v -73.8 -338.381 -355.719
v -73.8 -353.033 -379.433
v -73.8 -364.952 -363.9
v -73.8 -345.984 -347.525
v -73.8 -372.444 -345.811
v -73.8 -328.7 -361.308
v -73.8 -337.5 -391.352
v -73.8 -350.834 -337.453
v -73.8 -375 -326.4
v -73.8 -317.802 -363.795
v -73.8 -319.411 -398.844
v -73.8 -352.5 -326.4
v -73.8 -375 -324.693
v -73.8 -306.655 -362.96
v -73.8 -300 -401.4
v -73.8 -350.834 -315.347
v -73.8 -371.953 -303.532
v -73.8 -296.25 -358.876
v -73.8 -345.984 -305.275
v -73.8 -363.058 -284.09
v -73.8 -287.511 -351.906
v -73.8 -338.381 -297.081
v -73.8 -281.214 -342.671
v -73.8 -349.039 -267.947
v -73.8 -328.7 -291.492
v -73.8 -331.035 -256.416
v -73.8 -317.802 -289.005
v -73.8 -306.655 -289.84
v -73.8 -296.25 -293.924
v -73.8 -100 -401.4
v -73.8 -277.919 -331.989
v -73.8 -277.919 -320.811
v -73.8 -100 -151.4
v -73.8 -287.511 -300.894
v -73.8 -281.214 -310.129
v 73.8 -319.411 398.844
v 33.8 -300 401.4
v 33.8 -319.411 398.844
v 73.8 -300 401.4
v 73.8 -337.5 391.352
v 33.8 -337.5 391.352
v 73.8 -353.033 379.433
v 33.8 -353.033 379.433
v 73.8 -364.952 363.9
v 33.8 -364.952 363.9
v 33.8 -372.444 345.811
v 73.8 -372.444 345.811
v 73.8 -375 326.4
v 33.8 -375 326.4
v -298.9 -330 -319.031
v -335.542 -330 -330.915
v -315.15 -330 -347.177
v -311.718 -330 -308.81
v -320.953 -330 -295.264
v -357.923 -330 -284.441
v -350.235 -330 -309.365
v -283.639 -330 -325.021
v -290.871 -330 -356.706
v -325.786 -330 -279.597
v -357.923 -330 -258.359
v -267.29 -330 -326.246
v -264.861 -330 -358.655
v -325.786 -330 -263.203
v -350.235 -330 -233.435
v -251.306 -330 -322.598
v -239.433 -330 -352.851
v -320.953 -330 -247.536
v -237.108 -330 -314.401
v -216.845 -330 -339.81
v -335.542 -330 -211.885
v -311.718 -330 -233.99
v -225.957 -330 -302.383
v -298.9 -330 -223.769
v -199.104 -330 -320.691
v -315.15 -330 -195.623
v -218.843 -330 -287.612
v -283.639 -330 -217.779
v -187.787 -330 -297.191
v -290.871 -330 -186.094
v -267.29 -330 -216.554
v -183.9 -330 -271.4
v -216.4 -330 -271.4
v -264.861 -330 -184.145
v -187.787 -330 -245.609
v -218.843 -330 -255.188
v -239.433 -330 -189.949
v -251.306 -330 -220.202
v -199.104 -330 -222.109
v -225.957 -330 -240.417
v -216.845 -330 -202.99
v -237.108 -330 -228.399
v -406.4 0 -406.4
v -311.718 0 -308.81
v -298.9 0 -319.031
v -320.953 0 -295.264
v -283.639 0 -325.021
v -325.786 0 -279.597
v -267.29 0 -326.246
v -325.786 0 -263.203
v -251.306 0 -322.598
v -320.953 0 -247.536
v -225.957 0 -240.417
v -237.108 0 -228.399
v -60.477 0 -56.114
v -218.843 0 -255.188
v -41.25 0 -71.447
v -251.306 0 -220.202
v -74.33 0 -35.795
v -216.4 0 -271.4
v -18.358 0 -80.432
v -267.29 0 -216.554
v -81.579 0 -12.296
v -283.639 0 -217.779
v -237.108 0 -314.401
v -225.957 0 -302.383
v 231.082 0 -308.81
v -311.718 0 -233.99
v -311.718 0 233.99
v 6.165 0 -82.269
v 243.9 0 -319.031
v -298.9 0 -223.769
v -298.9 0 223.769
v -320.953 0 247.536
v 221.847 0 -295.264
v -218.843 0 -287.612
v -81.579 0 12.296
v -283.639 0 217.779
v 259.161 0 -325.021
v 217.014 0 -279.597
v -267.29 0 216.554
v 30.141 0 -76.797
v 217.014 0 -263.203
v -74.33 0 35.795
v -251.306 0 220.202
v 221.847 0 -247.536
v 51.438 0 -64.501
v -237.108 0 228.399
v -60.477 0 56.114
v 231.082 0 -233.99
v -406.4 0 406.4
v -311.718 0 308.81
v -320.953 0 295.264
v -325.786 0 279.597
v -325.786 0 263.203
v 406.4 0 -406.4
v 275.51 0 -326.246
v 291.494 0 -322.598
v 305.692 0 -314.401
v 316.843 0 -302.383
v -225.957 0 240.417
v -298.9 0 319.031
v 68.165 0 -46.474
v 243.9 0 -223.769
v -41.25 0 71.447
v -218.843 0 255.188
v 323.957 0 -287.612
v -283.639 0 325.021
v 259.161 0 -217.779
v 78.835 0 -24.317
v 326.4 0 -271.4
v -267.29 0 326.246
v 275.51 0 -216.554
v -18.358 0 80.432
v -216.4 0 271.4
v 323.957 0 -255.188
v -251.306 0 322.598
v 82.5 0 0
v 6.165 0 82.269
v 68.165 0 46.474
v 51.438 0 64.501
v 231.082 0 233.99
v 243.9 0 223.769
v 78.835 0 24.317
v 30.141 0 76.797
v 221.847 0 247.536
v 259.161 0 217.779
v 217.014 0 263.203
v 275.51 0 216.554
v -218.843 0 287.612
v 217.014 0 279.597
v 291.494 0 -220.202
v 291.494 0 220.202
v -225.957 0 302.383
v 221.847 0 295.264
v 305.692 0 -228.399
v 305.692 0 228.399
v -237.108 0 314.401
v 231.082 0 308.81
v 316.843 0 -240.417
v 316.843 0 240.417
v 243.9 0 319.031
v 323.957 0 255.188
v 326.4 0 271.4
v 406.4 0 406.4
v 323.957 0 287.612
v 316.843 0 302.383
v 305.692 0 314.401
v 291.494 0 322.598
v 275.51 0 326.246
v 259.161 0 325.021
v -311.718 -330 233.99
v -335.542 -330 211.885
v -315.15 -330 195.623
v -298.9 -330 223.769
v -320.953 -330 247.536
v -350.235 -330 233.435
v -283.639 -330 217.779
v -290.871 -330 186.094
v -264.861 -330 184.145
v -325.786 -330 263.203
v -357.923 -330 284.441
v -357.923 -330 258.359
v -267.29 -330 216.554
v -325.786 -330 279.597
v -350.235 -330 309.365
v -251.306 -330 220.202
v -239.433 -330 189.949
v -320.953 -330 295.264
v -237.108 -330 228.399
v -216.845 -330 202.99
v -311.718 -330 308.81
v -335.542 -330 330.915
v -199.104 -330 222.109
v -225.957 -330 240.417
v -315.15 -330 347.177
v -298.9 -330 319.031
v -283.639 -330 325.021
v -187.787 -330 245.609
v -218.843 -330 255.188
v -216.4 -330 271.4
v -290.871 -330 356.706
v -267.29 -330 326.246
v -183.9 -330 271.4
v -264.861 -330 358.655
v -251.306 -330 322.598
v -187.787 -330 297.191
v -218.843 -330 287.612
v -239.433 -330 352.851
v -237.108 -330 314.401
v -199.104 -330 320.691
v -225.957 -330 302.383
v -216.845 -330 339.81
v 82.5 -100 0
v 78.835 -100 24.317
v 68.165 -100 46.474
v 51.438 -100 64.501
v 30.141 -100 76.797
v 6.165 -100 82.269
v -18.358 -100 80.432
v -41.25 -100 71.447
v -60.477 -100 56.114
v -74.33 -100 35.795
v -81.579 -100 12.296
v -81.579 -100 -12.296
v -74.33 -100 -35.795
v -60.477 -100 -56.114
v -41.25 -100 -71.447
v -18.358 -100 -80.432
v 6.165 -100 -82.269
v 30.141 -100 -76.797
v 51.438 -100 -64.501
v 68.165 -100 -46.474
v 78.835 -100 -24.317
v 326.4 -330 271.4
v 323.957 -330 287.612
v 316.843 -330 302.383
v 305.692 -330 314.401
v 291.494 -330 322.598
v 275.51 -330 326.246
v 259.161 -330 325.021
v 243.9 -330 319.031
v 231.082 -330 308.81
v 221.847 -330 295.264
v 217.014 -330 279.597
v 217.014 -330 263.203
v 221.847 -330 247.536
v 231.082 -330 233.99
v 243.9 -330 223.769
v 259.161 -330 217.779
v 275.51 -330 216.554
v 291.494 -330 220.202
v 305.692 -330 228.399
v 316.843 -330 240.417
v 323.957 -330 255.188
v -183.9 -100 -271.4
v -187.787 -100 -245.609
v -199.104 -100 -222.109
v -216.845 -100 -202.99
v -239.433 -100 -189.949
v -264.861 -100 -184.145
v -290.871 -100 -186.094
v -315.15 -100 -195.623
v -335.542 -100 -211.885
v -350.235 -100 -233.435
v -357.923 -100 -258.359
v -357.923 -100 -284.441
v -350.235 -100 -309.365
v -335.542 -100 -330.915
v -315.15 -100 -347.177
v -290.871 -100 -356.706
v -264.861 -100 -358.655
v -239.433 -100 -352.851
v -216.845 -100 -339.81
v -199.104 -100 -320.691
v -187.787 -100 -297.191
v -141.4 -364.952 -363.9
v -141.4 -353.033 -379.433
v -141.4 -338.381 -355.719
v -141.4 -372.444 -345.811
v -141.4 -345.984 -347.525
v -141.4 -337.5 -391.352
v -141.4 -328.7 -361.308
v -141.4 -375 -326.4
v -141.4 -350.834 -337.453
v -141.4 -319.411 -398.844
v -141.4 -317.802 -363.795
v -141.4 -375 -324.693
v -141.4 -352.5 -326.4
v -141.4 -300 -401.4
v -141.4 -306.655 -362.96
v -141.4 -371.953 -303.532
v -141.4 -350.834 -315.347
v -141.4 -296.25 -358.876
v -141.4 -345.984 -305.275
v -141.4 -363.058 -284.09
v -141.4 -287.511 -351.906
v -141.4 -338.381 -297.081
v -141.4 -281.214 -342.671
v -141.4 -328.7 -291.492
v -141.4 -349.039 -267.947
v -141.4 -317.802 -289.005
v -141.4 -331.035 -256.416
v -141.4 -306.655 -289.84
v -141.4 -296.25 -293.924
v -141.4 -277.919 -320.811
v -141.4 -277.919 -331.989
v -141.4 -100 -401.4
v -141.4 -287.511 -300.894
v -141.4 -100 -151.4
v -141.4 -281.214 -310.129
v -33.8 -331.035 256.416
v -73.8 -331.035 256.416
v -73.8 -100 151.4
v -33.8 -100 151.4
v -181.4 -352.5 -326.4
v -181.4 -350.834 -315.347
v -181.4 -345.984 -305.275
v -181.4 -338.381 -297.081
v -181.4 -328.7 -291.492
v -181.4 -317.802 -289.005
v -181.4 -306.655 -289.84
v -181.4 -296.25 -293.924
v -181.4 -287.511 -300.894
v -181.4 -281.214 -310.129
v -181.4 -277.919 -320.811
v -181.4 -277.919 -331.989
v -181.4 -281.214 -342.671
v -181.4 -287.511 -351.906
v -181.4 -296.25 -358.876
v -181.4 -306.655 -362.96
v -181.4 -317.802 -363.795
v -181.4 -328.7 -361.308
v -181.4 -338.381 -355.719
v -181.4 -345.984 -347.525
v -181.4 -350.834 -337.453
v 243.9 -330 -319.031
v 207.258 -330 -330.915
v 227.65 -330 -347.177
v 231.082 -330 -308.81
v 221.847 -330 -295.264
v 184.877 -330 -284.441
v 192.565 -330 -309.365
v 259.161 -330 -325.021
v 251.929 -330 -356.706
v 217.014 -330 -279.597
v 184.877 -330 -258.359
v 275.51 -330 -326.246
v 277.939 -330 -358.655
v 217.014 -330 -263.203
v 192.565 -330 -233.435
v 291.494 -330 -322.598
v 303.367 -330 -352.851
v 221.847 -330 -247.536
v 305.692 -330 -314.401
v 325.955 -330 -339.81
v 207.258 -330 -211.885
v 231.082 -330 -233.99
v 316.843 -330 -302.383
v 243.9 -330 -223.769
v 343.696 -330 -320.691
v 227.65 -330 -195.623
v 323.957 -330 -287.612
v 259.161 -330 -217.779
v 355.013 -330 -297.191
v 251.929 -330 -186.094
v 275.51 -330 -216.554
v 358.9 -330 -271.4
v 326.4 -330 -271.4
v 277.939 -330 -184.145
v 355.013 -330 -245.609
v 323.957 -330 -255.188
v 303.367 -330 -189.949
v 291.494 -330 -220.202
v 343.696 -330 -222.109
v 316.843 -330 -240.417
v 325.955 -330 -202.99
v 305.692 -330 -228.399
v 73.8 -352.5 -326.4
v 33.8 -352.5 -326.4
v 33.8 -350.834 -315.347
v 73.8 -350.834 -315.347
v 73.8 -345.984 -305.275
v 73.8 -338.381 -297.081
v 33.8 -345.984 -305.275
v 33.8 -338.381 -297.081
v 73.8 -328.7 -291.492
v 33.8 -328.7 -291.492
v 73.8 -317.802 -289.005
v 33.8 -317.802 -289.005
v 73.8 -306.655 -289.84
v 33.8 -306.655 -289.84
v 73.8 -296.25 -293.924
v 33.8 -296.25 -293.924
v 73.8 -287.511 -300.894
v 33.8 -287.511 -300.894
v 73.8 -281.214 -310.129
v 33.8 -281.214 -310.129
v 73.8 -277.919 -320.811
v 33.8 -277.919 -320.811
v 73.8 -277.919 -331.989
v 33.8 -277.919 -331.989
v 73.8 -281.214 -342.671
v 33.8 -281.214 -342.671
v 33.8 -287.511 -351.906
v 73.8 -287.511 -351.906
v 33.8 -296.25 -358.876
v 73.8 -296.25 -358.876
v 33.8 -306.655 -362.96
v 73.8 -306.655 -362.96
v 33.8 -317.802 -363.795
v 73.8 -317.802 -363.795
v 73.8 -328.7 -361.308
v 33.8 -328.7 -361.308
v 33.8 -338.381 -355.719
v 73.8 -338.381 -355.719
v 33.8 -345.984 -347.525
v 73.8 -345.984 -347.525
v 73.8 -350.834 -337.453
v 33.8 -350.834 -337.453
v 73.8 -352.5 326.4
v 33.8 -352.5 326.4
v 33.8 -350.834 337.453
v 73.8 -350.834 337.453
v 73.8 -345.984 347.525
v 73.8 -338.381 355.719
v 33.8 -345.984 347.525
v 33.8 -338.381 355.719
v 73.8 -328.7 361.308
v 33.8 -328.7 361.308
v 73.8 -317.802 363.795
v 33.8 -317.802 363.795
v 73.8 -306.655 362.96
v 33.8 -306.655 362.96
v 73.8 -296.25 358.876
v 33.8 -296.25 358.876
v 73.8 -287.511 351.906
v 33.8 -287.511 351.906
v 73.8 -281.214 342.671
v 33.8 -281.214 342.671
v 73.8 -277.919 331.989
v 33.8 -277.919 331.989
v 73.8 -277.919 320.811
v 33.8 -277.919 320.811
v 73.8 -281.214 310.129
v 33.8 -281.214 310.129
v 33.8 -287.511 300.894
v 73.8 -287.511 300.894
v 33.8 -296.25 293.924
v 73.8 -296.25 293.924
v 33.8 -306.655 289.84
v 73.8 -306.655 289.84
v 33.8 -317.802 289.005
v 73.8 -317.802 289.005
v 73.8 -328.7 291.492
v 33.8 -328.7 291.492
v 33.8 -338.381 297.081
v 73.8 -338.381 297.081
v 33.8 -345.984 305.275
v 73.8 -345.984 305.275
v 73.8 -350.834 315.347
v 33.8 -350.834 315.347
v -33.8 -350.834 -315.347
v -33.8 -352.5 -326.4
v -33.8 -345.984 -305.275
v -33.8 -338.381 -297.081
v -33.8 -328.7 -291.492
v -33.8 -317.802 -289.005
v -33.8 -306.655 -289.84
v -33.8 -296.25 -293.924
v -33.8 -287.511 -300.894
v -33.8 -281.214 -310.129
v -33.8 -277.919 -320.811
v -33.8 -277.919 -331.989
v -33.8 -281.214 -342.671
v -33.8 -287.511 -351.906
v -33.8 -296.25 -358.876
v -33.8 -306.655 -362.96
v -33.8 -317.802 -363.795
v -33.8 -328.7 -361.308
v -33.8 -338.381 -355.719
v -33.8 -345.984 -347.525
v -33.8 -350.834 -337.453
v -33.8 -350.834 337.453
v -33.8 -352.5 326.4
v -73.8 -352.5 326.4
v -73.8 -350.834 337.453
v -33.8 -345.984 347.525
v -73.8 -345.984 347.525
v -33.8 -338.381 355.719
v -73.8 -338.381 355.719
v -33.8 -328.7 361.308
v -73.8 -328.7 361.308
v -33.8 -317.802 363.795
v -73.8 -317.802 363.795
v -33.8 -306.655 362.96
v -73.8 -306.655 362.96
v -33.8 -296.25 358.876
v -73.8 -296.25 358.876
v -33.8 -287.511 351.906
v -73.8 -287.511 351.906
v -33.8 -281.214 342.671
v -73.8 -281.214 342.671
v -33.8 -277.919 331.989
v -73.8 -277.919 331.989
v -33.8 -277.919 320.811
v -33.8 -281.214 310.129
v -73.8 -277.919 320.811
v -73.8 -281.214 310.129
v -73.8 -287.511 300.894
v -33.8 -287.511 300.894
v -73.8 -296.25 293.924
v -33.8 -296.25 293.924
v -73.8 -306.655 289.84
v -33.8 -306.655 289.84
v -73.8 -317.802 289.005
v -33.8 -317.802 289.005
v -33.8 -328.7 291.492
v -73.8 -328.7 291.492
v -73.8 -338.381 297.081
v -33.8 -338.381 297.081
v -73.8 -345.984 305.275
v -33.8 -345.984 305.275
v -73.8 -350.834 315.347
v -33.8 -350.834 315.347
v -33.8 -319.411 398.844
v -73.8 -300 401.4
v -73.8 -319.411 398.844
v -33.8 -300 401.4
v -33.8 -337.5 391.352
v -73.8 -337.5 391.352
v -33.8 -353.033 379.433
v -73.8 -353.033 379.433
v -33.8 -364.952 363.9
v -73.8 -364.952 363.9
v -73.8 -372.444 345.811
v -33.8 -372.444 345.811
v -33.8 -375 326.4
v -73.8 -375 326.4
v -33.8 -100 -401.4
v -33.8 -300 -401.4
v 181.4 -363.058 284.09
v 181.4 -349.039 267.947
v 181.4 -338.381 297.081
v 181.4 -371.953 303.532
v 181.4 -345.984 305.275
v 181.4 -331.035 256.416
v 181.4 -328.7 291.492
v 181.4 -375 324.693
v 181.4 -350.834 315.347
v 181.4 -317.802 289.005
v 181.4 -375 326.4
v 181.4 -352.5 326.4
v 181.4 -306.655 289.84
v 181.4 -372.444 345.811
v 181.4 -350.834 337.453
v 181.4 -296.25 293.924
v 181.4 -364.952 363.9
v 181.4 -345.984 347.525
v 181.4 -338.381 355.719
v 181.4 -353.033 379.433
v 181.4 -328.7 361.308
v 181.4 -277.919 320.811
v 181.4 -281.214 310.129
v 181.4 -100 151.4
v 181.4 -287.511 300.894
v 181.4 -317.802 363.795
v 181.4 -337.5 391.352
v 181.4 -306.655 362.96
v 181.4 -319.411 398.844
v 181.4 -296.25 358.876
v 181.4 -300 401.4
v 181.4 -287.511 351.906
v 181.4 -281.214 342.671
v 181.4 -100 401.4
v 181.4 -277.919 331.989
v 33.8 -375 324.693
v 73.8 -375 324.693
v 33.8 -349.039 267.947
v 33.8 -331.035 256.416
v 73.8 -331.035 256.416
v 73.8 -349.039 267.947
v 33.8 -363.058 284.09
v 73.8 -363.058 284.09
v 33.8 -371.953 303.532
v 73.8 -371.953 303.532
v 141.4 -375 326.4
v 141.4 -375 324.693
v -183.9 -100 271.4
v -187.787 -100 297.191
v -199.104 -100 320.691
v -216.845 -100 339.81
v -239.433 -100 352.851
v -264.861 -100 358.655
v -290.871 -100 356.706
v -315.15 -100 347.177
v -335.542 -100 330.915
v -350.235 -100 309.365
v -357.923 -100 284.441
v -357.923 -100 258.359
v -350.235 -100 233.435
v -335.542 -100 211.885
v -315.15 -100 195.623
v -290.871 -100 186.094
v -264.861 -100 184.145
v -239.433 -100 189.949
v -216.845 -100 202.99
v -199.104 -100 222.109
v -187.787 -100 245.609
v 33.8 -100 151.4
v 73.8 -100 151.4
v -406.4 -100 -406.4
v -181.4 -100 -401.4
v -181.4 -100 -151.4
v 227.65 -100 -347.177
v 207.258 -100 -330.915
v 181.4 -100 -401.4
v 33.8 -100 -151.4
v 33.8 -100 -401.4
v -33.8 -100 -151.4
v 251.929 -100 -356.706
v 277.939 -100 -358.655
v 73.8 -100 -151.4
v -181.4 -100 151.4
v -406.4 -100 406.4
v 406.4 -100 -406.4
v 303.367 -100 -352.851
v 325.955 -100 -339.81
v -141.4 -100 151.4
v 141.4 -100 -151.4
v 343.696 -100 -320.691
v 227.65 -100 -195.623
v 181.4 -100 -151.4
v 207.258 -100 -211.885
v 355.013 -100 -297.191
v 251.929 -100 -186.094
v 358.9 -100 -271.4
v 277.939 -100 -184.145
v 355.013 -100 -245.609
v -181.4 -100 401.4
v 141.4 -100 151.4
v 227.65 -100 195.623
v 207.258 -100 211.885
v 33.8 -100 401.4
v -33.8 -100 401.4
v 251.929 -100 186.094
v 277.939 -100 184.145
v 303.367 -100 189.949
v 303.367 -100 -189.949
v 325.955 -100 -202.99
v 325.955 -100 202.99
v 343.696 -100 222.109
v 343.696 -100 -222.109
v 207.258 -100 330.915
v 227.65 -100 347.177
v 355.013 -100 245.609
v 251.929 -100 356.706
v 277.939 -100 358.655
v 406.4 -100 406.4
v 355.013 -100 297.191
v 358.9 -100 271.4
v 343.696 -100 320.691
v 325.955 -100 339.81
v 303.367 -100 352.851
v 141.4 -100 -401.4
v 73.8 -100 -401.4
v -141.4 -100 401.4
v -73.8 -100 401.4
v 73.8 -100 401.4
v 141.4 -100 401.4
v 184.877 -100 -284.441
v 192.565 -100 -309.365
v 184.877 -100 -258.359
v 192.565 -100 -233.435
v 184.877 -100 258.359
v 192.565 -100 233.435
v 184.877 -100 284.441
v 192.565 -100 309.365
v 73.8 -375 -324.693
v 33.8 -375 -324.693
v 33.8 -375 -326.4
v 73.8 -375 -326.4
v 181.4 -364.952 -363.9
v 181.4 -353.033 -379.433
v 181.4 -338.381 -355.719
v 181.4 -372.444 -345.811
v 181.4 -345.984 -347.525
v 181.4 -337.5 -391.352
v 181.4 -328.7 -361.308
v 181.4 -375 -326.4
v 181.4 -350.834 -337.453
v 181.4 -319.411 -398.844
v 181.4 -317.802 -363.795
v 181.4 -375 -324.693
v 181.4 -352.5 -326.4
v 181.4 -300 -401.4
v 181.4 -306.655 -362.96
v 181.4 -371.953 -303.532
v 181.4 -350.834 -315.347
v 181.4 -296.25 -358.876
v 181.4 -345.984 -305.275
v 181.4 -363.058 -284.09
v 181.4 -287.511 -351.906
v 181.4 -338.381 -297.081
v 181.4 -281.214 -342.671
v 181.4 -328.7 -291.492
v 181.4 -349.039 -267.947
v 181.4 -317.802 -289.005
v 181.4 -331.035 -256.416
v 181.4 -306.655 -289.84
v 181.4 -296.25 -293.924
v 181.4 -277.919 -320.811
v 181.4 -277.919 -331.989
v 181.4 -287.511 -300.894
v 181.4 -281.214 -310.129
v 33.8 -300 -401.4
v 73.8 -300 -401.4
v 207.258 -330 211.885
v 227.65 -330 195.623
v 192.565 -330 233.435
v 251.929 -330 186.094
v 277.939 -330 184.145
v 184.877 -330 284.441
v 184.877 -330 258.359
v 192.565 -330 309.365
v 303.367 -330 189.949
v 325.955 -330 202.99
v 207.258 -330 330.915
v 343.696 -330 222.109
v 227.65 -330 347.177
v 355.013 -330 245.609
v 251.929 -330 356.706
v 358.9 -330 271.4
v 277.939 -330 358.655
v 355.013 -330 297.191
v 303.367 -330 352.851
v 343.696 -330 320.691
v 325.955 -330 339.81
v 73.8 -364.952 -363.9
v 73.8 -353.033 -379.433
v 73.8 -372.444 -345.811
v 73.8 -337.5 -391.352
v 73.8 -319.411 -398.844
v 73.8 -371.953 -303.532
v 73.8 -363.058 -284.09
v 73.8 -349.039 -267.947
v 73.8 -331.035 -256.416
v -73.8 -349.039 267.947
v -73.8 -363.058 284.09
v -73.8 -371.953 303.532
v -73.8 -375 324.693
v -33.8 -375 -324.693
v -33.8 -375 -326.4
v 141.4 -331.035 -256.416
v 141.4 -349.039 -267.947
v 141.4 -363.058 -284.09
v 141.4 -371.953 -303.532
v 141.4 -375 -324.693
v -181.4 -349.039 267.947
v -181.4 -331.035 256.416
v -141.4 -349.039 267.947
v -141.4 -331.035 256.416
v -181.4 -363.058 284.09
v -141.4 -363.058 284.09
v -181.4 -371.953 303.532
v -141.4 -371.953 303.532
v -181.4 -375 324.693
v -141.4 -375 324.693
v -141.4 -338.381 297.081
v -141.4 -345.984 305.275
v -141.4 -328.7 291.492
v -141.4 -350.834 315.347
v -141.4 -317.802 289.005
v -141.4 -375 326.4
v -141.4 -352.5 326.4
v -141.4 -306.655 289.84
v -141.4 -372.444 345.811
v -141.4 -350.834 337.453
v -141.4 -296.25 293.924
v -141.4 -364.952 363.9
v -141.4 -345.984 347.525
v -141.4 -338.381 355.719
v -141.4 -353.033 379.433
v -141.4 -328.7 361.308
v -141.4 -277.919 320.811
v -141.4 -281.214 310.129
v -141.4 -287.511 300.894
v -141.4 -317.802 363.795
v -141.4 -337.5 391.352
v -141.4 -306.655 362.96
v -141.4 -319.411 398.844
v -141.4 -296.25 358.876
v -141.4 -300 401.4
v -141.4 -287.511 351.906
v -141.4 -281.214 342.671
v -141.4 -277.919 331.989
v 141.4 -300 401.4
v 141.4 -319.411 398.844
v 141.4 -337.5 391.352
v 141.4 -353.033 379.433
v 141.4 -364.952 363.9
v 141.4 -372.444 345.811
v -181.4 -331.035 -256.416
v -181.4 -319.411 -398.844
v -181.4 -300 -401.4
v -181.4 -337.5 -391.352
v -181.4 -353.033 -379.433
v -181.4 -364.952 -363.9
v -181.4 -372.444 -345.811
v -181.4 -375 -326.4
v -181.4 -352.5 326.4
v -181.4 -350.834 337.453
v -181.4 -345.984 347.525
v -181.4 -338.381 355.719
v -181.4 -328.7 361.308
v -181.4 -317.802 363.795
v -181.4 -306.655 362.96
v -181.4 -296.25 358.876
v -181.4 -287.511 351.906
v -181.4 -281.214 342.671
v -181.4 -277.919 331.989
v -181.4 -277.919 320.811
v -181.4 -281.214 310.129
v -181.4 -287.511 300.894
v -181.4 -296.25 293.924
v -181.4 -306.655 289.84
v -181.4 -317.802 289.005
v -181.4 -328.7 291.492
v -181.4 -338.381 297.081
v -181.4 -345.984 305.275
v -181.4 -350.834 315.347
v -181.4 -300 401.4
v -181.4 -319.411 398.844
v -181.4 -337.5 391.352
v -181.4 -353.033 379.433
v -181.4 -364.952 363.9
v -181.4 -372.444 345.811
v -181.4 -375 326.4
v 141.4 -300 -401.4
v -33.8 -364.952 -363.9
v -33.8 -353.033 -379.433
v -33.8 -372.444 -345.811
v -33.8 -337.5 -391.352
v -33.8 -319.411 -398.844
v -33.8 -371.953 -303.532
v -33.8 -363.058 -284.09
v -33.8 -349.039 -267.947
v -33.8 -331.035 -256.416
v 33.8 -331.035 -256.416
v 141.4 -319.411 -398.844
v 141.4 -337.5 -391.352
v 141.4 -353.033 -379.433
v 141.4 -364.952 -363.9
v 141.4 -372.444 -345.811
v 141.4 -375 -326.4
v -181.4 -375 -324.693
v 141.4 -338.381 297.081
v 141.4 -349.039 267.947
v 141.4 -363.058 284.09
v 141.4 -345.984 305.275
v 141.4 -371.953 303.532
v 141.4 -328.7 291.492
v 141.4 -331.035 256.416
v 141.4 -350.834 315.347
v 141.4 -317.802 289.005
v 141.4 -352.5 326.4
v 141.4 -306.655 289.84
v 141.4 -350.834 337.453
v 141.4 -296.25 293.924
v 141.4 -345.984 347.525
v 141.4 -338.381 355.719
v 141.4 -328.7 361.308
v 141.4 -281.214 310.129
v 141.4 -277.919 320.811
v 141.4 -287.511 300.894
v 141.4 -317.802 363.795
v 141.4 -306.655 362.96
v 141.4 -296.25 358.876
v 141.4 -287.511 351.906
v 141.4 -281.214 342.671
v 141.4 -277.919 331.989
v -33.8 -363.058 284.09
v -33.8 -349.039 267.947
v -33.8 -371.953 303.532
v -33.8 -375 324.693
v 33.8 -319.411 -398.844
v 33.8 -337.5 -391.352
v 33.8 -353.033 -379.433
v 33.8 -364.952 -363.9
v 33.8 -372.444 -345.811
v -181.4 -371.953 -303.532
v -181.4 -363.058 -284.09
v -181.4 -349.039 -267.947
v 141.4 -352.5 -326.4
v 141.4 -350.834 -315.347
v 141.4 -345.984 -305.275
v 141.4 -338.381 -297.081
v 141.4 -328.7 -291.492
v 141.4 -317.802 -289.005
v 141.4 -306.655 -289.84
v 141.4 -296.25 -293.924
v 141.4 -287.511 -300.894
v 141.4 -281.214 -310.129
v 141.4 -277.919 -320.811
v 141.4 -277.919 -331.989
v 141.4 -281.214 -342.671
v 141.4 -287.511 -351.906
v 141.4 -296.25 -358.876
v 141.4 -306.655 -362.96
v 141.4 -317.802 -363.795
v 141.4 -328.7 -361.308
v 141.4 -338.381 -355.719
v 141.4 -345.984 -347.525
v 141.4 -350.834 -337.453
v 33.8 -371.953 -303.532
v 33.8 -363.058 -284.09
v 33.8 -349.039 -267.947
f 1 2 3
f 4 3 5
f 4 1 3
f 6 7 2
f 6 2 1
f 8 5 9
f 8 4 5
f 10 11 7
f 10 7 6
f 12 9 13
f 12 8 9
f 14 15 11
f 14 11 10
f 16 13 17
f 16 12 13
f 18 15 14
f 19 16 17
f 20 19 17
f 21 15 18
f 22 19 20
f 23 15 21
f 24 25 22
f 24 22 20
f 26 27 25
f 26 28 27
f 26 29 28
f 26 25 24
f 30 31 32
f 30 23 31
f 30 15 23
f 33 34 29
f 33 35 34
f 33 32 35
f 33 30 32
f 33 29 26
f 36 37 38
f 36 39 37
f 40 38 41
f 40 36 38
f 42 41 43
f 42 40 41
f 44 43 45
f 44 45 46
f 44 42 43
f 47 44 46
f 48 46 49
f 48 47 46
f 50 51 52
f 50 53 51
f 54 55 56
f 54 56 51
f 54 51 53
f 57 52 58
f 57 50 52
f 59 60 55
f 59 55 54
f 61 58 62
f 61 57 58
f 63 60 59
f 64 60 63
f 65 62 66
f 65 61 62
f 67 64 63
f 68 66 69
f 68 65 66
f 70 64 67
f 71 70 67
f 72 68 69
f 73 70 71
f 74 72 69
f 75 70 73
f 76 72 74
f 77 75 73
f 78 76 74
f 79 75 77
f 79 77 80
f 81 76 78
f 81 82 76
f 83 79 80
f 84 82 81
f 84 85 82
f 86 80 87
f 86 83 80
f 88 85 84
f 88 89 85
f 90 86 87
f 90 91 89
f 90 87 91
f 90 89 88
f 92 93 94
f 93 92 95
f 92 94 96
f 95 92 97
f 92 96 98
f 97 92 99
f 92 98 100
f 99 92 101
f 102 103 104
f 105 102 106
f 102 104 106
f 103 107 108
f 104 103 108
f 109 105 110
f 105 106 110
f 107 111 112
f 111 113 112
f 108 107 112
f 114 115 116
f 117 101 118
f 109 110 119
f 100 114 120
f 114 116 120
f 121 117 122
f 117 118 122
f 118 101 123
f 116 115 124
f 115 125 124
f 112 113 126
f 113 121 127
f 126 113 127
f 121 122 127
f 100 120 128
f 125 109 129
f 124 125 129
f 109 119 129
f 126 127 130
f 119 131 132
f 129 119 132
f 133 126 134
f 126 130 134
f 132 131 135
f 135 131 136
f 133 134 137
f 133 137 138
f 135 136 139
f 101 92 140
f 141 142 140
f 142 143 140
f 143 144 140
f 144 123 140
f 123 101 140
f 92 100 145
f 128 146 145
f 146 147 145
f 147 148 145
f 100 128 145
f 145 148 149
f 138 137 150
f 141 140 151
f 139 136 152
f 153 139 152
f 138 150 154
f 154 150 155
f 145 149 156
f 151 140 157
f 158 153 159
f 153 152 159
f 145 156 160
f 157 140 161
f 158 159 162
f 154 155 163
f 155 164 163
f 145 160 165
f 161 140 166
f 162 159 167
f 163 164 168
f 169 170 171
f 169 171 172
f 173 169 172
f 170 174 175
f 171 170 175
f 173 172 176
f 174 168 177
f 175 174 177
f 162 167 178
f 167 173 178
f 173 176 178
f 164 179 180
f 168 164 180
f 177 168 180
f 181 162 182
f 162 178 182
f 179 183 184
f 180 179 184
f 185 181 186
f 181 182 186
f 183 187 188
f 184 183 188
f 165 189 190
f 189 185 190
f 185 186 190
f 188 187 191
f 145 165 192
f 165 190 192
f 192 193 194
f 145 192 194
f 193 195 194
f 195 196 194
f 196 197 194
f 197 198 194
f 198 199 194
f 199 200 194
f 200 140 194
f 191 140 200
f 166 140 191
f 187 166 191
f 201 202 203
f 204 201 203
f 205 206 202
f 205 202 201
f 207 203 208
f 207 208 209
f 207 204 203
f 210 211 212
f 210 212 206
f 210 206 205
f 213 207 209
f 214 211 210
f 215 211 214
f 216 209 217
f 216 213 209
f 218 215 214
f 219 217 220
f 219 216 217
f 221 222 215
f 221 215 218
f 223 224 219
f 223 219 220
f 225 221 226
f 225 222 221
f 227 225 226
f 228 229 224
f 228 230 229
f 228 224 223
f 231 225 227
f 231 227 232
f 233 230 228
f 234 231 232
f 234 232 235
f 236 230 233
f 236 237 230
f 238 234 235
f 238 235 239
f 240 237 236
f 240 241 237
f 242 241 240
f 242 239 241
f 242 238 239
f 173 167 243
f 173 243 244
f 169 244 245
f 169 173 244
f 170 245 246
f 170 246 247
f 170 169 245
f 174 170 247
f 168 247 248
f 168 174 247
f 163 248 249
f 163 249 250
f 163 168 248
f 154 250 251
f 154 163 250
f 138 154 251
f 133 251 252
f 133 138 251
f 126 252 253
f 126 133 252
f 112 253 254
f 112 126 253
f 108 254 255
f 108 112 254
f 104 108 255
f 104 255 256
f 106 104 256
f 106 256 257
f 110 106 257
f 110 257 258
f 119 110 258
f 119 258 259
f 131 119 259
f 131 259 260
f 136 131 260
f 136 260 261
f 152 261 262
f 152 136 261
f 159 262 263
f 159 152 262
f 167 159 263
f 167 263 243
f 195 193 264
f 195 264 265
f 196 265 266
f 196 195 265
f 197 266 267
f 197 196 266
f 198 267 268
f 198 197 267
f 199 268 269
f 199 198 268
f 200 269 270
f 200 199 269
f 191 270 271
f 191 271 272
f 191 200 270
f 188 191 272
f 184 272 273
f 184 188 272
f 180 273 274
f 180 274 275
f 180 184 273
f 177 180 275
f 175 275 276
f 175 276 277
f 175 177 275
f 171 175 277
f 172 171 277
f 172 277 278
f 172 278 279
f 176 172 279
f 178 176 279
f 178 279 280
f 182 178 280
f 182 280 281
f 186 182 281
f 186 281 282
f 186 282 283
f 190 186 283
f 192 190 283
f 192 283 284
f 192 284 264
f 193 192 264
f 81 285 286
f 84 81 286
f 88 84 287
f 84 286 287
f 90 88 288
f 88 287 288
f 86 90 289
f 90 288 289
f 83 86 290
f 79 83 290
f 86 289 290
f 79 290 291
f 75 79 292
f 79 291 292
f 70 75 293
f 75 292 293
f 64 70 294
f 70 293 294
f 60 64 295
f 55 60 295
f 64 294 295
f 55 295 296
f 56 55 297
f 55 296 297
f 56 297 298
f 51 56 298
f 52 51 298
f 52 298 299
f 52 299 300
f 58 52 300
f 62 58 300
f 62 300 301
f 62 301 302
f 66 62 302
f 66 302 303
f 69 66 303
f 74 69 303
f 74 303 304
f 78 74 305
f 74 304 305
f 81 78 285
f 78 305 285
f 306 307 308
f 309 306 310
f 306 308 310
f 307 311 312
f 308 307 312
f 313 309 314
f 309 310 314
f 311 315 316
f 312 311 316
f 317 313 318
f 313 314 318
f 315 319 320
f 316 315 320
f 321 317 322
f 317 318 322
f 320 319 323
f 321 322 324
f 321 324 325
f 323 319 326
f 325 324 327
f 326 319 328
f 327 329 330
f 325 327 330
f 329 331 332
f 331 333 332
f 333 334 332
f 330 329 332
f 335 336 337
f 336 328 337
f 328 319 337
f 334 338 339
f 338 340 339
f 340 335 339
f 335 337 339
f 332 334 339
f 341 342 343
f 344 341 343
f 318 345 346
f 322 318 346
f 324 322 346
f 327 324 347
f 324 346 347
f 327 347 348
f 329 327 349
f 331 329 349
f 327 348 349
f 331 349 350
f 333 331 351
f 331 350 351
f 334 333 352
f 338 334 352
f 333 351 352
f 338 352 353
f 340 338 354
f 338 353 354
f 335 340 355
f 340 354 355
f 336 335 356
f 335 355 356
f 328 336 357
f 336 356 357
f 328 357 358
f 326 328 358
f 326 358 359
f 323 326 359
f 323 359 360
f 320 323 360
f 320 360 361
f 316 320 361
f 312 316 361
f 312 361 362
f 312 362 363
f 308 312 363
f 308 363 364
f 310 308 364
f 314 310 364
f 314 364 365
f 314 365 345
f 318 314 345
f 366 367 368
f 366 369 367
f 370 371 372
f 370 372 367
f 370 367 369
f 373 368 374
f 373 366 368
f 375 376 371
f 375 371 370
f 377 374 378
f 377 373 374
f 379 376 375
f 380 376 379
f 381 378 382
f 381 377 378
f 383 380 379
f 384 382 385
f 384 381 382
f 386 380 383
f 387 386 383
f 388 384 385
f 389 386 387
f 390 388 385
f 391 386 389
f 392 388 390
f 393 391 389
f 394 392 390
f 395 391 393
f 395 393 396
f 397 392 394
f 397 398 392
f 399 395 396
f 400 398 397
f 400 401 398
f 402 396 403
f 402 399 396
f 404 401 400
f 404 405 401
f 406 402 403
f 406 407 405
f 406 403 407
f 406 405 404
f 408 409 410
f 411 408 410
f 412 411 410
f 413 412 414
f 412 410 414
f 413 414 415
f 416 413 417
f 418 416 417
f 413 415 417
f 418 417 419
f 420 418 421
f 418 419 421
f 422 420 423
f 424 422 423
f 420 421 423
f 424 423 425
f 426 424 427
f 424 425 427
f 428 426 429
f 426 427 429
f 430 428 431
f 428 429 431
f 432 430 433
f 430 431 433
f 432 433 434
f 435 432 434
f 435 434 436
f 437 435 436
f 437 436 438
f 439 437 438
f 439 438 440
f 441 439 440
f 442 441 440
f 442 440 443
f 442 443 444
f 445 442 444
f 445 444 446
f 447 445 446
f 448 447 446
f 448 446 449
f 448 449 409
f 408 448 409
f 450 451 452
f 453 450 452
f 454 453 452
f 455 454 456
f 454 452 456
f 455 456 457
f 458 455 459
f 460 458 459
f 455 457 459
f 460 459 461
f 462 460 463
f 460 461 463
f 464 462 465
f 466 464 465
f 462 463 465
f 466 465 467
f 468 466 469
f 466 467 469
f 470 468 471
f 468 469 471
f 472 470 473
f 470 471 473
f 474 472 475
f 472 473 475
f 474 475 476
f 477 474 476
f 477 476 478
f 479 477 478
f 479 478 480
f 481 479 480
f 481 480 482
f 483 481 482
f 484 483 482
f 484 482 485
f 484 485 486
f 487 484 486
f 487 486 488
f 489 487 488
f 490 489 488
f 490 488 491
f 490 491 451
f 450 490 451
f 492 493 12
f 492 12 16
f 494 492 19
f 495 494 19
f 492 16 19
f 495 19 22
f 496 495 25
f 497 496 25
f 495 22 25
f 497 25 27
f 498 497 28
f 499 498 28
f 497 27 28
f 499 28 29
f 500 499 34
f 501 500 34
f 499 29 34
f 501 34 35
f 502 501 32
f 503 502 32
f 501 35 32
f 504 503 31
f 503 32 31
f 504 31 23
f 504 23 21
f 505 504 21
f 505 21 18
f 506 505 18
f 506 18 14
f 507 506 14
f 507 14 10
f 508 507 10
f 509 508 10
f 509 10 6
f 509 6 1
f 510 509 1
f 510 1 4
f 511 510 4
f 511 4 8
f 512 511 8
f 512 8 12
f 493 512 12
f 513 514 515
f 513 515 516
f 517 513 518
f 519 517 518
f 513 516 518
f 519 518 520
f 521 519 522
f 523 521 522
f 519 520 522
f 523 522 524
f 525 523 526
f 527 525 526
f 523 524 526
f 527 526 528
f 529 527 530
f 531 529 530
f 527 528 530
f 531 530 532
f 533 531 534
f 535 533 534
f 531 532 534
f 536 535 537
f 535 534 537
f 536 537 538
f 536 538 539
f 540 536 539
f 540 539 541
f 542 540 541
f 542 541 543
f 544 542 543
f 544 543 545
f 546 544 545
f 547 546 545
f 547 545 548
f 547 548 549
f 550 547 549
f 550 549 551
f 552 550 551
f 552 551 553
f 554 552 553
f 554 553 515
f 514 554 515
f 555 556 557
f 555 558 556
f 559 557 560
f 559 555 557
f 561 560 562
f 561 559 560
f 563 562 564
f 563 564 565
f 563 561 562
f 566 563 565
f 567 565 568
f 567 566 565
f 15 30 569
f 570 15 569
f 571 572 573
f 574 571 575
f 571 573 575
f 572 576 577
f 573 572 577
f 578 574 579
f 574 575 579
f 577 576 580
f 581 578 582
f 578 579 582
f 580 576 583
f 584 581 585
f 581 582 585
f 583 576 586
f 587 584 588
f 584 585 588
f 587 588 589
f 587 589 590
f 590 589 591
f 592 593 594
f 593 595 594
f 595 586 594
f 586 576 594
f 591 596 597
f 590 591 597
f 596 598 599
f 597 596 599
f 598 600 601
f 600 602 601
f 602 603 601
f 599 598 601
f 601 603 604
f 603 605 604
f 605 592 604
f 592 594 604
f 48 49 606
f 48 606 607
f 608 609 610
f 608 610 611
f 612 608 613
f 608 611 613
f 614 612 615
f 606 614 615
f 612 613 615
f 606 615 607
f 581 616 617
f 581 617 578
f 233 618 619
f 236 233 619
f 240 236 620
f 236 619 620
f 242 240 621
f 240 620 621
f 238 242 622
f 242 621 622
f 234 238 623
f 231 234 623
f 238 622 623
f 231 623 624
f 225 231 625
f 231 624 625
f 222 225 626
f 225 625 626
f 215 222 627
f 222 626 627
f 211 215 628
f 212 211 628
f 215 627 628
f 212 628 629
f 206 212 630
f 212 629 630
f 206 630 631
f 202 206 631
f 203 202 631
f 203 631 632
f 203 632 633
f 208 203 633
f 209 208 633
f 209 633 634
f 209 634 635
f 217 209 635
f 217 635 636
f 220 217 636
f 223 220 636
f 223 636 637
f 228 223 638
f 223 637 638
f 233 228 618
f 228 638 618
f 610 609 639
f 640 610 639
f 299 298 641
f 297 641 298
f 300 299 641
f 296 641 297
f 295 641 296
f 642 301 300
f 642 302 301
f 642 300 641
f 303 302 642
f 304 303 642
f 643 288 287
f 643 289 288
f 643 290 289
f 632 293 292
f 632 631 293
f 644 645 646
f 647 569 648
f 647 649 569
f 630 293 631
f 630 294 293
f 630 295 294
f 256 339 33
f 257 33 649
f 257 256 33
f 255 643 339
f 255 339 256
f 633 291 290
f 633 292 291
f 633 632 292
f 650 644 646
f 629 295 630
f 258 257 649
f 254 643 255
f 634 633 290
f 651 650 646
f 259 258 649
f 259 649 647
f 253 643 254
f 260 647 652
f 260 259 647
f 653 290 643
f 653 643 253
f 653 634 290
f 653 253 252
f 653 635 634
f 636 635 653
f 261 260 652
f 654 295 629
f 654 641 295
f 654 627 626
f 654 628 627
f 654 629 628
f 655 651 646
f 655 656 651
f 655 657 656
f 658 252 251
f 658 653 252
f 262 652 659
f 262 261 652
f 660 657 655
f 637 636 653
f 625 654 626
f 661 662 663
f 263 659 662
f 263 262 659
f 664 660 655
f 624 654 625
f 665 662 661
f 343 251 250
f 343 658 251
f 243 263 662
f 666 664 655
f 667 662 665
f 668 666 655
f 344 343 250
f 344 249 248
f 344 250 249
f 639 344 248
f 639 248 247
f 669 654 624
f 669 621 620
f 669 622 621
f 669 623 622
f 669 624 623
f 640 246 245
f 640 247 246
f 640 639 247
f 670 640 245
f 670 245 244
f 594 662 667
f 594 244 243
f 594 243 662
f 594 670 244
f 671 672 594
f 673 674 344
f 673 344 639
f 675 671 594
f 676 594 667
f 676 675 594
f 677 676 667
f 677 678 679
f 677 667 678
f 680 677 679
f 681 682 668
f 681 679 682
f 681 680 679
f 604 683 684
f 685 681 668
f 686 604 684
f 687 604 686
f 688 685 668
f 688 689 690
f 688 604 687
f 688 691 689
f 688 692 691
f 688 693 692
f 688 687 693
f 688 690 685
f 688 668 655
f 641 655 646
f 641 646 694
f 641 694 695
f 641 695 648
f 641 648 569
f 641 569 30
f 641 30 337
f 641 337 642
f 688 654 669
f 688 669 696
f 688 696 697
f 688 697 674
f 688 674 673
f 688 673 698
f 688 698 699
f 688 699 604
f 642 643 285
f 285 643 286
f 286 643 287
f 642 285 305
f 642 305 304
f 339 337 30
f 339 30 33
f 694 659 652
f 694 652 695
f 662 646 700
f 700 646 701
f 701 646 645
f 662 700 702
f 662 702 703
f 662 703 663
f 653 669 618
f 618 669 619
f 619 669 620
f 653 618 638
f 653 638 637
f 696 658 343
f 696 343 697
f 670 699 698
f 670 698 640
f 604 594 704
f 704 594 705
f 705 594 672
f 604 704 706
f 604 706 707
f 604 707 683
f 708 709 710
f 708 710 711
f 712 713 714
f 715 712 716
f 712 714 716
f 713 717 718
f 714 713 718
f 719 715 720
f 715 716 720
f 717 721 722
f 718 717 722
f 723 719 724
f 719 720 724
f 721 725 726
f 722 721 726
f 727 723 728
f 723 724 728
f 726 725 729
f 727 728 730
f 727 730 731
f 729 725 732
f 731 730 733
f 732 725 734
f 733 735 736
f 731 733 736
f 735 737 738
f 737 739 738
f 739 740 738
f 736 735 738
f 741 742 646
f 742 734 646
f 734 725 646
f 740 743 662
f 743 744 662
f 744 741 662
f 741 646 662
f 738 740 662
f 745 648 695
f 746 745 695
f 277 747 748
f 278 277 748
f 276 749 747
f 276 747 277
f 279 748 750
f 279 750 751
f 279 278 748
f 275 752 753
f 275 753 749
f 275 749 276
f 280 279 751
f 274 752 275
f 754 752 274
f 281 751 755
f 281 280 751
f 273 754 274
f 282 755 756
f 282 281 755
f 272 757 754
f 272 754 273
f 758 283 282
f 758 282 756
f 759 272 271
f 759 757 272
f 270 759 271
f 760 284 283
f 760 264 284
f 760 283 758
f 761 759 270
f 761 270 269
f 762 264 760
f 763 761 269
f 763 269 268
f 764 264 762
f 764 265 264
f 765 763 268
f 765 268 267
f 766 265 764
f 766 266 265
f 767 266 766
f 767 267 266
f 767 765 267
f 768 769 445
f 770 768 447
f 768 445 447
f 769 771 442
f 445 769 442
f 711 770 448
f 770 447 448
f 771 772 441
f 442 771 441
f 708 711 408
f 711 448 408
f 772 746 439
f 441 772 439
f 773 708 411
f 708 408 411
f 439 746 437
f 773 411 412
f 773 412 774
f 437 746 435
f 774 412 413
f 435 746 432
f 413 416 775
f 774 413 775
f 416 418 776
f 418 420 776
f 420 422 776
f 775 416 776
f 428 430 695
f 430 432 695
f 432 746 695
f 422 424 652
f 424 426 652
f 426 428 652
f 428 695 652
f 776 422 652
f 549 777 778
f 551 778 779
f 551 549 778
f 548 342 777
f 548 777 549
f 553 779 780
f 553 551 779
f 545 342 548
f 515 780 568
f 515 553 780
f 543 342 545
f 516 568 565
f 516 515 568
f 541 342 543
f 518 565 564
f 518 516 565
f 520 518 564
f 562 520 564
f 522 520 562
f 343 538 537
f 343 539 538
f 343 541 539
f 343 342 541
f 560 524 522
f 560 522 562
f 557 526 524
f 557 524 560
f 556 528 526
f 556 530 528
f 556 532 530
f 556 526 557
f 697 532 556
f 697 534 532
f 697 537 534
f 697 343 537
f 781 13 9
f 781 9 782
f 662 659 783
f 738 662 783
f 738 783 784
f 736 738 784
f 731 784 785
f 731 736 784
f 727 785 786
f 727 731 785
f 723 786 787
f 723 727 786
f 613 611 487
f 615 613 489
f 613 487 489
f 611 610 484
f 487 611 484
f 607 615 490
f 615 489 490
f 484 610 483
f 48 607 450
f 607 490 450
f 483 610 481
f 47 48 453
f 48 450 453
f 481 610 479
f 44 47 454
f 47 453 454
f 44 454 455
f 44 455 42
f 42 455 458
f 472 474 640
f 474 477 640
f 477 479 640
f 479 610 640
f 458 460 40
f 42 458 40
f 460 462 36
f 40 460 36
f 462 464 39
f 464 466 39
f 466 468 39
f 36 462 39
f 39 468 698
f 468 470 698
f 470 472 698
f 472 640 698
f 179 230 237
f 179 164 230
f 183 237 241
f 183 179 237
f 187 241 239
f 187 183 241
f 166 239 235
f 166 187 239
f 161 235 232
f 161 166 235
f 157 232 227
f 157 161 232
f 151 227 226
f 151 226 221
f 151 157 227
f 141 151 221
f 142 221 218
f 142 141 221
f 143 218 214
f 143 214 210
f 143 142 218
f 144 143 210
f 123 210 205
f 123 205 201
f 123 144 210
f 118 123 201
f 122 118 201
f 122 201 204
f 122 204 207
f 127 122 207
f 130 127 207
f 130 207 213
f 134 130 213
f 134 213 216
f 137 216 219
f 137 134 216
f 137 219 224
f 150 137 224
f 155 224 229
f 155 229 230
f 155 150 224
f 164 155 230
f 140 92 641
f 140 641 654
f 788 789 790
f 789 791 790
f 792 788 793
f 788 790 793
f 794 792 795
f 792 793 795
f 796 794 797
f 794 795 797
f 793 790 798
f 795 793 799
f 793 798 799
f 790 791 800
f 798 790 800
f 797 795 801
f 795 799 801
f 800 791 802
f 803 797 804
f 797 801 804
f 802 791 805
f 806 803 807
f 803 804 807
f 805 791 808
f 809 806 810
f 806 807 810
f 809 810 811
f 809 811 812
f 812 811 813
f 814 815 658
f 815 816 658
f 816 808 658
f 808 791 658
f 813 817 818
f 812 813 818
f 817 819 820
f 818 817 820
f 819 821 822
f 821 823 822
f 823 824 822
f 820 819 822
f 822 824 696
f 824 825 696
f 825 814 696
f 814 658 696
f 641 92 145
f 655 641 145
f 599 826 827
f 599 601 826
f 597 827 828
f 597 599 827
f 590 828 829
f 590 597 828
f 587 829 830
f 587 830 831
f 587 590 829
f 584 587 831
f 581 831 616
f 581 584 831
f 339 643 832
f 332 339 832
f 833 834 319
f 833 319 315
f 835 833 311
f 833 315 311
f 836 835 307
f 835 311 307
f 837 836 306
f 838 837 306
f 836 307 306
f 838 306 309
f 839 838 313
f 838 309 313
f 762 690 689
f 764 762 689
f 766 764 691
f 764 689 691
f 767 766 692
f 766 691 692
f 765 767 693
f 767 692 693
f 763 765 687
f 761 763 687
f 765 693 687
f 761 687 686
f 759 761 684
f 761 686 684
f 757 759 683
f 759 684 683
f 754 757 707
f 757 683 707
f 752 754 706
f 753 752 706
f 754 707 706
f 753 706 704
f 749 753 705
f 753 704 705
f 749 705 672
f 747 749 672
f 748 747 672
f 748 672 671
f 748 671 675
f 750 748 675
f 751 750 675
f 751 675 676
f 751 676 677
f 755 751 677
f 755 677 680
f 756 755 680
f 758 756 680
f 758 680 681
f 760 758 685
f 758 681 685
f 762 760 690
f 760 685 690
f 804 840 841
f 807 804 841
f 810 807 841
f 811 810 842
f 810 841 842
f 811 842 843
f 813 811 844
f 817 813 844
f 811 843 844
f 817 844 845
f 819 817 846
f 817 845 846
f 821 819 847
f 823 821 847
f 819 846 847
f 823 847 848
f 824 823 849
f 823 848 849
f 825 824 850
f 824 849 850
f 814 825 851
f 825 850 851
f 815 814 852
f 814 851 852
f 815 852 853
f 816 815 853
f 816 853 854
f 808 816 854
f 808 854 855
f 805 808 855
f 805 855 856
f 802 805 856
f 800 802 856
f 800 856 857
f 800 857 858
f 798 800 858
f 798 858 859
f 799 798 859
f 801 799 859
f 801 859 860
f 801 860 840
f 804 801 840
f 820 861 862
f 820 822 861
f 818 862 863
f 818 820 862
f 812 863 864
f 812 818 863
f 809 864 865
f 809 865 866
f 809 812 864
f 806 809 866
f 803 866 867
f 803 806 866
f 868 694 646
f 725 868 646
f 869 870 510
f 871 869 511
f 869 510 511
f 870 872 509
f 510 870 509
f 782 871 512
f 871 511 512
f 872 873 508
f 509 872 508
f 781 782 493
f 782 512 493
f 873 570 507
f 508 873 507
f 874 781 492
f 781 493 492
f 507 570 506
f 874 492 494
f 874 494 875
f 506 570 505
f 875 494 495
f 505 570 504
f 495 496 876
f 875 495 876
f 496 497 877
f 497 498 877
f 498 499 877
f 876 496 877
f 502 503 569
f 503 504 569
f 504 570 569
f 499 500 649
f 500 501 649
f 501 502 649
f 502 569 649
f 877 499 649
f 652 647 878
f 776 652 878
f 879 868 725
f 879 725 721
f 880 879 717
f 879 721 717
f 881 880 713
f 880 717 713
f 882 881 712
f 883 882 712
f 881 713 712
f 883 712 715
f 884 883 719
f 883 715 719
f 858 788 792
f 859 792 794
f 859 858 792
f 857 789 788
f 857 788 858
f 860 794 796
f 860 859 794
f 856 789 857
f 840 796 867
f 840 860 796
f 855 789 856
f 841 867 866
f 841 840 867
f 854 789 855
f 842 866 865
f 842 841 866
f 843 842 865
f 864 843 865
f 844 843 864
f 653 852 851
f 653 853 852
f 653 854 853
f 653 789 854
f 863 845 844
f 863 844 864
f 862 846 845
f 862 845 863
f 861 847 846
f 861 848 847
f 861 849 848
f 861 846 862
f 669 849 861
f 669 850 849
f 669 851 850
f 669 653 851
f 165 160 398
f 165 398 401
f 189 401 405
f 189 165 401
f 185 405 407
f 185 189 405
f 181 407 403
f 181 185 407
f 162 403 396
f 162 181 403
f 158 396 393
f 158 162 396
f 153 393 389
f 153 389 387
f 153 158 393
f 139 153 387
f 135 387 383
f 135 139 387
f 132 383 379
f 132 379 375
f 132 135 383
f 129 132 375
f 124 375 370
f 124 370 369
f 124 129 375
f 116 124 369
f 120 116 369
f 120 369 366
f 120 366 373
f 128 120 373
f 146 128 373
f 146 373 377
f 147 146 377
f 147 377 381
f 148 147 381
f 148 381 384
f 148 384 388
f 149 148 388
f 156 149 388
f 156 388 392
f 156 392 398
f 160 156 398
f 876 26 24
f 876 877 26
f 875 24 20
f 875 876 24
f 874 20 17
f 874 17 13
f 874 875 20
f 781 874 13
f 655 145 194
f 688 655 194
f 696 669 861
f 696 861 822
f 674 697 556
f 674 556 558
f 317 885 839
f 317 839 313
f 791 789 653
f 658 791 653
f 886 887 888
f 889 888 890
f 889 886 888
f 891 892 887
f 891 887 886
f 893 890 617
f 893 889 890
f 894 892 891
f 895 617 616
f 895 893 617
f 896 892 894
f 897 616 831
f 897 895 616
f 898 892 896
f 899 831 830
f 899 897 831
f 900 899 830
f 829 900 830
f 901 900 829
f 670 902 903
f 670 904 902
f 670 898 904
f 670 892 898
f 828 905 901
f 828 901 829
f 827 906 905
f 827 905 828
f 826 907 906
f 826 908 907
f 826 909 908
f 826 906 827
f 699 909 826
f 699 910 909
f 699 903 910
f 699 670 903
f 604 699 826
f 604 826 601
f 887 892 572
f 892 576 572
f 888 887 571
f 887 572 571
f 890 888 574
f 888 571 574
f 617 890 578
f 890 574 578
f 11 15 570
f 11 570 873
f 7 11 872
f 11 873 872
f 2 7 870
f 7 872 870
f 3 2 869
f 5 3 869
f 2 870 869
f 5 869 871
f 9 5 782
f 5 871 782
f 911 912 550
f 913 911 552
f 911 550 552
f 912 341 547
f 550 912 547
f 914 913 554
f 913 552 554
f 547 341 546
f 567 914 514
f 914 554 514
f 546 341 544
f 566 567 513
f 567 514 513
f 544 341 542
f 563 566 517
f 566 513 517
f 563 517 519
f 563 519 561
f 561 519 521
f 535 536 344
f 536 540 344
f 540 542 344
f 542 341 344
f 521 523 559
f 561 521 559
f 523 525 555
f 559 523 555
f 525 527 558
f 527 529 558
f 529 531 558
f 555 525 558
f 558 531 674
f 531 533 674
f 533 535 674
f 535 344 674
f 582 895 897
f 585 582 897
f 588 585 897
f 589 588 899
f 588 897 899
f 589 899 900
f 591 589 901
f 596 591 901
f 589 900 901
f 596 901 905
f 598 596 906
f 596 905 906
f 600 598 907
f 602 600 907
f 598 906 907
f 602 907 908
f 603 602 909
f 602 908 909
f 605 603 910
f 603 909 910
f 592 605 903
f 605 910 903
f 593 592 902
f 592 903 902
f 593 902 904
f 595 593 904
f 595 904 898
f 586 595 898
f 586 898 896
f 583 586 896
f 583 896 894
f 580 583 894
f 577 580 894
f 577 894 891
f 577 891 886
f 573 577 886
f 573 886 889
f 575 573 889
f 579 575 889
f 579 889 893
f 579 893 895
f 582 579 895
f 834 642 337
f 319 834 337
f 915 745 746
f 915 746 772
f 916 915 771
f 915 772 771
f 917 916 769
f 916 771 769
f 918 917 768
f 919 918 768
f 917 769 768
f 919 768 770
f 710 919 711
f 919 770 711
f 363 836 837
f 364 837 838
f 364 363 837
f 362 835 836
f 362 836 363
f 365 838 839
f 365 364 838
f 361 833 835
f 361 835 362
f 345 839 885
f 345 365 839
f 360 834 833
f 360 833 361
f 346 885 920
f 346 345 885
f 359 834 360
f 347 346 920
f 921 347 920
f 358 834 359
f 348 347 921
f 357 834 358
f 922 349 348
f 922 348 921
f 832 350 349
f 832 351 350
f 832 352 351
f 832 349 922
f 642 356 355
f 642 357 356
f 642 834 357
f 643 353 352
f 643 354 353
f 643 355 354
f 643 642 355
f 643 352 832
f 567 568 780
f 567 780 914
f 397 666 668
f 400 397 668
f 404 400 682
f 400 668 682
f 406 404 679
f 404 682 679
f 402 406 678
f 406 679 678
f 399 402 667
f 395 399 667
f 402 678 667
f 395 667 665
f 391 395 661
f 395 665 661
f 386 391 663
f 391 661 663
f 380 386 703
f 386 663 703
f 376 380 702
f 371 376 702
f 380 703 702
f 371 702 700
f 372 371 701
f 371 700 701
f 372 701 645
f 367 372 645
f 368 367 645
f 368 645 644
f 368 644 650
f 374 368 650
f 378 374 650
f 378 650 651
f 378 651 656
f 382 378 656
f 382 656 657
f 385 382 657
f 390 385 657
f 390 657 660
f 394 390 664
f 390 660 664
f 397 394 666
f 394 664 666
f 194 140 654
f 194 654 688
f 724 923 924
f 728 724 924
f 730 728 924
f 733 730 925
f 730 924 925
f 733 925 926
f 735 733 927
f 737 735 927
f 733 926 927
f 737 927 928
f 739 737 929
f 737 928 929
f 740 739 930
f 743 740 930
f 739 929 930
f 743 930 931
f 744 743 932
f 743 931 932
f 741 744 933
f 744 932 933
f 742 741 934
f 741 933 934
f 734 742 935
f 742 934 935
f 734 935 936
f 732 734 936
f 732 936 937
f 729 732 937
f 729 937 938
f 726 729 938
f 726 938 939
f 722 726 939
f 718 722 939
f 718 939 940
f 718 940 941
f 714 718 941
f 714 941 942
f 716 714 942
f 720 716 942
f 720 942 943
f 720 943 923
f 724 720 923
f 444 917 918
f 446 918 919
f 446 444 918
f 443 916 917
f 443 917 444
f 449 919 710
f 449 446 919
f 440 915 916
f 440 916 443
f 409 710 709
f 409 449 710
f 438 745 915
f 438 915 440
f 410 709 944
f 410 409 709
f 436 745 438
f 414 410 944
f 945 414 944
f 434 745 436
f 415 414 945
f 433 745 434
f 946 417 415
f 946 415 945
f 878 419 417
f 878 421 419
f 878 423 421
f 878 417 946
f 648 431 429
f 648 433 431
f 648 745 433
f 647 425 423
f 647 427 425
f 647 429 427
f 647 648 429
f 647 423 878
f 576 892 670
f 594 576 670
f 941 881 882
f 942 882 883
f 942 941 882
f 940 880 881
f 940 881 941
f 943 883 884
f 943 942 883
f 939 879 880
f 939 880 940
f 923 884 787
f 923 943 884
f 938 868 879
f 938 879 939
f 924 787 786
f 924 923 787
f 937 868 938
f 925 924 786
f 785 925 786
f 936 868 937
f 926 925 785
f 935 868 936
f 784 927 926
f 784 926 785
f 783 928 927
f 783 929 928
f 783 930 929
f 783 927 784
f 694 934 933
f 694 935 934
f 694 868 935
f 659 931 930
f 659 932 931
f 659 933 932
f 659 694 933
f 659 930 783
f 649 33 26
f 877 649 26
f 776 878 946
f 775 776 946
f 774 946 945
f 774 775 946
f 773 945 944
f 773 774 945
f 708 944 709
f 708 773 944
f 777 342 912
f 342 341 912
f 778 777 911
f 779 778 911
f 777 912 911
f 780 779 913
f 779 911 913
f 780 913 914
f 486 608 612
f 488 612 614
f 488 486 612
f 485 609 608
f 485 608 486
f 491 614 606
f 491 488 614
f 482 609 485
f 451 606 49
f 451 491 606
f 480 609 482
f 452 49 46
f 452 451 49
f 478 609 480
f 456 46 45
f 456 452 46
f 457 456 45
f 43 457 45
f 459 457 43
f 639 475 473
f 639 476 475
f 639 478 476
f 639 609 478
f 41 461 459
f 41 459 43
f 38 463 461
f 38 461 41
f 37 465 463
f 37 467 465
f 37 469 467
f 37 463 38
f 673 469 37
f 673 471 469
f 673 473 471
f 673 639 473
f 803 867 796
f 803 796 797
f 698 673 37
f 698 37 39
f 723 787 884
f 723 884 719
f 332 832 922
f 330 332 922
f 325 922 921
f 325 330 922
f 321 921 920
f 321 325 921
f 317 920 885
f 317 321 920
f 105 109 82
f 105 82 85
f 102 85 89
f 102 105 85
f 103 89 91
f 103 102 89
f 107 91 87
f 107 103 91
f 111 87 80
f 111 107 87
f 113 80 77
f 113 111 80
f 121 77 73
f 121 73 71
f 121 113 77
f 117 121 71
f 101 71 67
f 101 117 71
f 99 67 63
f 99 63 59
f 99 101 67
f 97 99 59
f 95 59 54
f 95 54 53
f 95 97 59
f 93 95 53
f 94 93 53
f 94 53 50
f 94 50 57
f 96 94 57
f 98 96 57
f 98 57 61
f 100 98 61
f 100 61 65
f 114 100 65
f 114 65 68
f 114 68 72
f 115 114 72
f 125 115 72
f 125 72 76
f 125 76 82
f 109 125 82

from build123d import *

# Parameters (mm, degrees)
F0_W      = 812.8
F0_H      = 812.8
F0_R      = 55
F0_R_2    = 82.5
F1_DEPTH  = 100
F2_R      = 87.5
F2_R_2    = 55
F3_DEPTH  = 230
F4_W      = 40
F4_H      = 250
F5_DEPTH  = 275
F7_DEPTH  = 362.8
F8_R      = 75
F9_R      = 37.5
F10_DEPTH = 362.8


with BuildPart() as f1:
    # F0 (on Front) → F1 (new body)
    with BuildSketch(Plane.XZ):
        Rectangle(F0_W, F0_H)
        with Locations((-271.4, -271.4)):
            Circle(F0_R, mode=Mode.SUBTRACT)
        Circle(F0_R_2, mode=Mode.SUBTRACT)
        with Locations((271.4, -271.4)):
            Circle(F0_R, mode=Mode.SUBTRACT)
        with Locations((-271.4, 271.4)):
            Circle(F0_R, mode=Mode.SUBTRACT)
        with Locations((271.4, 271.4)):
            Circle(F0_R, mode=Mode.SUBTRACT)
    extrude(amount=F1_DEPTH)

    # F2 (on face) → F3 (join)
    with BuildSketch(Plane.XZ.offset(100)):
        with Locations((-271.4, 271.4)):
            Circle(F2_R)
        with Locations((-271.4, 271.4)):
            Circle(F2_R_2, mode=Mode.SUBTRACT)
        with Locations((271.4, 271.4)):
            Circle(F2_R)
        with Locations((271.4, 271.4)):
            Circle(F2_R_2, mode=Mode.SUBTRACT)
        with Locations((271.4, -271.4)):
            Circle(F2_R)
        with Locations((271.4, -271.4)):
            Circle(F2_R_2, mode=Mode.SUBTRACT)
        with Locations((-271.4, -271.4)):
            Circle(F2_R)
        with Locations((-271.4, -271.4)):
            Circle(F2_R_2, mode=Mode.SUBTRACT)
    extrude(amount=F3_DEPTH)

    # F4 (on face) → F5 (join)
    with BuildSketch(Plane.XZ.offset(100)):
        with Locations((-53.8, 276.4)):
            Rectangle(F4_W, F4_H)
        with Locations((53.8, 276.4)):
            Rectangle(F4_W, F4_H)
        with Locations((161.4, 276.4)):
            Rectangle(F4_W, F4_H)
        with Locations((161.4, -276.4)):
            Rectangle(F4_W, F4_H)
        with Locations((53.8, -276.4)):
            Rectangle(F4_W, F4_H)
        with Locations((-53.8, -276.4)):
            Rectangle(F4_W, F4_H)
        with Locations((-161.4, 276.4)):
            Rectangle(F4_W, F4_H)
        with Locations((-161.4, -276.4)):
            Rectangle(F4_W, F4_H)
    extrude(amount=F5_DEPTH)

    # F6 (on face) → F7 (cut, through all)
    with BuildSketch(Plane(origin=(-181.4, 0, 0), x_dir=(0, -1, 0), z_dir=(-1, 0, 0))):
        Polygon((375, 151.4), (375, 276.4), (100, 151.4), align=None)
        Polygon((375, -151.4), (100, -151.4), (375, -276.4), align=None)
    extrude(amount=-F7_DEPTH, mode=Mode.SUBTRACT)

    # F8
    f8_edges = [f1.edges().sort_by_distance(p)[0] for p in [
        (161.4, -375, 401.4),
        (161.4, -375, 276.4),
        (53.8, -375, 401.4),
        (53.8, -375, 276.4),
        (-53.8, -375, 401.4),
        (-53.8, -375, 276.4),
        (-161.4, -375, 401.4),
        (-161.4, -375, 276.4),
        (-161.4, -375, -276.4),
        (-161.4, -375, -401.4),
        (-53.8, -375, -276.4),
        (-53.8, -375, -401.4),
        (53.8, -375, -276.4),
        (53.8, -375, -401.4),
        (161.4, -375, -276.4),
        (161.4, -375, -401.4),
    ]]
    fillet(f8_edges, radius=F8_R)

    # F9 (on face) → F10 (cut, through all)
    with BuildSketch(Plane(origin=(-181.4, 0, 0), x_dir=(0, -1, 0), z_dir=(-1, 0, 0))):
        with Locations((315, 326.4)):
            Circle(F9_R)
        with Locations((315, -326.4)):
            Circle(F9_R)
    extrude(amount=-F10_DEPTH, mode=Mode.SUBTRACT)


solid = f1.part
